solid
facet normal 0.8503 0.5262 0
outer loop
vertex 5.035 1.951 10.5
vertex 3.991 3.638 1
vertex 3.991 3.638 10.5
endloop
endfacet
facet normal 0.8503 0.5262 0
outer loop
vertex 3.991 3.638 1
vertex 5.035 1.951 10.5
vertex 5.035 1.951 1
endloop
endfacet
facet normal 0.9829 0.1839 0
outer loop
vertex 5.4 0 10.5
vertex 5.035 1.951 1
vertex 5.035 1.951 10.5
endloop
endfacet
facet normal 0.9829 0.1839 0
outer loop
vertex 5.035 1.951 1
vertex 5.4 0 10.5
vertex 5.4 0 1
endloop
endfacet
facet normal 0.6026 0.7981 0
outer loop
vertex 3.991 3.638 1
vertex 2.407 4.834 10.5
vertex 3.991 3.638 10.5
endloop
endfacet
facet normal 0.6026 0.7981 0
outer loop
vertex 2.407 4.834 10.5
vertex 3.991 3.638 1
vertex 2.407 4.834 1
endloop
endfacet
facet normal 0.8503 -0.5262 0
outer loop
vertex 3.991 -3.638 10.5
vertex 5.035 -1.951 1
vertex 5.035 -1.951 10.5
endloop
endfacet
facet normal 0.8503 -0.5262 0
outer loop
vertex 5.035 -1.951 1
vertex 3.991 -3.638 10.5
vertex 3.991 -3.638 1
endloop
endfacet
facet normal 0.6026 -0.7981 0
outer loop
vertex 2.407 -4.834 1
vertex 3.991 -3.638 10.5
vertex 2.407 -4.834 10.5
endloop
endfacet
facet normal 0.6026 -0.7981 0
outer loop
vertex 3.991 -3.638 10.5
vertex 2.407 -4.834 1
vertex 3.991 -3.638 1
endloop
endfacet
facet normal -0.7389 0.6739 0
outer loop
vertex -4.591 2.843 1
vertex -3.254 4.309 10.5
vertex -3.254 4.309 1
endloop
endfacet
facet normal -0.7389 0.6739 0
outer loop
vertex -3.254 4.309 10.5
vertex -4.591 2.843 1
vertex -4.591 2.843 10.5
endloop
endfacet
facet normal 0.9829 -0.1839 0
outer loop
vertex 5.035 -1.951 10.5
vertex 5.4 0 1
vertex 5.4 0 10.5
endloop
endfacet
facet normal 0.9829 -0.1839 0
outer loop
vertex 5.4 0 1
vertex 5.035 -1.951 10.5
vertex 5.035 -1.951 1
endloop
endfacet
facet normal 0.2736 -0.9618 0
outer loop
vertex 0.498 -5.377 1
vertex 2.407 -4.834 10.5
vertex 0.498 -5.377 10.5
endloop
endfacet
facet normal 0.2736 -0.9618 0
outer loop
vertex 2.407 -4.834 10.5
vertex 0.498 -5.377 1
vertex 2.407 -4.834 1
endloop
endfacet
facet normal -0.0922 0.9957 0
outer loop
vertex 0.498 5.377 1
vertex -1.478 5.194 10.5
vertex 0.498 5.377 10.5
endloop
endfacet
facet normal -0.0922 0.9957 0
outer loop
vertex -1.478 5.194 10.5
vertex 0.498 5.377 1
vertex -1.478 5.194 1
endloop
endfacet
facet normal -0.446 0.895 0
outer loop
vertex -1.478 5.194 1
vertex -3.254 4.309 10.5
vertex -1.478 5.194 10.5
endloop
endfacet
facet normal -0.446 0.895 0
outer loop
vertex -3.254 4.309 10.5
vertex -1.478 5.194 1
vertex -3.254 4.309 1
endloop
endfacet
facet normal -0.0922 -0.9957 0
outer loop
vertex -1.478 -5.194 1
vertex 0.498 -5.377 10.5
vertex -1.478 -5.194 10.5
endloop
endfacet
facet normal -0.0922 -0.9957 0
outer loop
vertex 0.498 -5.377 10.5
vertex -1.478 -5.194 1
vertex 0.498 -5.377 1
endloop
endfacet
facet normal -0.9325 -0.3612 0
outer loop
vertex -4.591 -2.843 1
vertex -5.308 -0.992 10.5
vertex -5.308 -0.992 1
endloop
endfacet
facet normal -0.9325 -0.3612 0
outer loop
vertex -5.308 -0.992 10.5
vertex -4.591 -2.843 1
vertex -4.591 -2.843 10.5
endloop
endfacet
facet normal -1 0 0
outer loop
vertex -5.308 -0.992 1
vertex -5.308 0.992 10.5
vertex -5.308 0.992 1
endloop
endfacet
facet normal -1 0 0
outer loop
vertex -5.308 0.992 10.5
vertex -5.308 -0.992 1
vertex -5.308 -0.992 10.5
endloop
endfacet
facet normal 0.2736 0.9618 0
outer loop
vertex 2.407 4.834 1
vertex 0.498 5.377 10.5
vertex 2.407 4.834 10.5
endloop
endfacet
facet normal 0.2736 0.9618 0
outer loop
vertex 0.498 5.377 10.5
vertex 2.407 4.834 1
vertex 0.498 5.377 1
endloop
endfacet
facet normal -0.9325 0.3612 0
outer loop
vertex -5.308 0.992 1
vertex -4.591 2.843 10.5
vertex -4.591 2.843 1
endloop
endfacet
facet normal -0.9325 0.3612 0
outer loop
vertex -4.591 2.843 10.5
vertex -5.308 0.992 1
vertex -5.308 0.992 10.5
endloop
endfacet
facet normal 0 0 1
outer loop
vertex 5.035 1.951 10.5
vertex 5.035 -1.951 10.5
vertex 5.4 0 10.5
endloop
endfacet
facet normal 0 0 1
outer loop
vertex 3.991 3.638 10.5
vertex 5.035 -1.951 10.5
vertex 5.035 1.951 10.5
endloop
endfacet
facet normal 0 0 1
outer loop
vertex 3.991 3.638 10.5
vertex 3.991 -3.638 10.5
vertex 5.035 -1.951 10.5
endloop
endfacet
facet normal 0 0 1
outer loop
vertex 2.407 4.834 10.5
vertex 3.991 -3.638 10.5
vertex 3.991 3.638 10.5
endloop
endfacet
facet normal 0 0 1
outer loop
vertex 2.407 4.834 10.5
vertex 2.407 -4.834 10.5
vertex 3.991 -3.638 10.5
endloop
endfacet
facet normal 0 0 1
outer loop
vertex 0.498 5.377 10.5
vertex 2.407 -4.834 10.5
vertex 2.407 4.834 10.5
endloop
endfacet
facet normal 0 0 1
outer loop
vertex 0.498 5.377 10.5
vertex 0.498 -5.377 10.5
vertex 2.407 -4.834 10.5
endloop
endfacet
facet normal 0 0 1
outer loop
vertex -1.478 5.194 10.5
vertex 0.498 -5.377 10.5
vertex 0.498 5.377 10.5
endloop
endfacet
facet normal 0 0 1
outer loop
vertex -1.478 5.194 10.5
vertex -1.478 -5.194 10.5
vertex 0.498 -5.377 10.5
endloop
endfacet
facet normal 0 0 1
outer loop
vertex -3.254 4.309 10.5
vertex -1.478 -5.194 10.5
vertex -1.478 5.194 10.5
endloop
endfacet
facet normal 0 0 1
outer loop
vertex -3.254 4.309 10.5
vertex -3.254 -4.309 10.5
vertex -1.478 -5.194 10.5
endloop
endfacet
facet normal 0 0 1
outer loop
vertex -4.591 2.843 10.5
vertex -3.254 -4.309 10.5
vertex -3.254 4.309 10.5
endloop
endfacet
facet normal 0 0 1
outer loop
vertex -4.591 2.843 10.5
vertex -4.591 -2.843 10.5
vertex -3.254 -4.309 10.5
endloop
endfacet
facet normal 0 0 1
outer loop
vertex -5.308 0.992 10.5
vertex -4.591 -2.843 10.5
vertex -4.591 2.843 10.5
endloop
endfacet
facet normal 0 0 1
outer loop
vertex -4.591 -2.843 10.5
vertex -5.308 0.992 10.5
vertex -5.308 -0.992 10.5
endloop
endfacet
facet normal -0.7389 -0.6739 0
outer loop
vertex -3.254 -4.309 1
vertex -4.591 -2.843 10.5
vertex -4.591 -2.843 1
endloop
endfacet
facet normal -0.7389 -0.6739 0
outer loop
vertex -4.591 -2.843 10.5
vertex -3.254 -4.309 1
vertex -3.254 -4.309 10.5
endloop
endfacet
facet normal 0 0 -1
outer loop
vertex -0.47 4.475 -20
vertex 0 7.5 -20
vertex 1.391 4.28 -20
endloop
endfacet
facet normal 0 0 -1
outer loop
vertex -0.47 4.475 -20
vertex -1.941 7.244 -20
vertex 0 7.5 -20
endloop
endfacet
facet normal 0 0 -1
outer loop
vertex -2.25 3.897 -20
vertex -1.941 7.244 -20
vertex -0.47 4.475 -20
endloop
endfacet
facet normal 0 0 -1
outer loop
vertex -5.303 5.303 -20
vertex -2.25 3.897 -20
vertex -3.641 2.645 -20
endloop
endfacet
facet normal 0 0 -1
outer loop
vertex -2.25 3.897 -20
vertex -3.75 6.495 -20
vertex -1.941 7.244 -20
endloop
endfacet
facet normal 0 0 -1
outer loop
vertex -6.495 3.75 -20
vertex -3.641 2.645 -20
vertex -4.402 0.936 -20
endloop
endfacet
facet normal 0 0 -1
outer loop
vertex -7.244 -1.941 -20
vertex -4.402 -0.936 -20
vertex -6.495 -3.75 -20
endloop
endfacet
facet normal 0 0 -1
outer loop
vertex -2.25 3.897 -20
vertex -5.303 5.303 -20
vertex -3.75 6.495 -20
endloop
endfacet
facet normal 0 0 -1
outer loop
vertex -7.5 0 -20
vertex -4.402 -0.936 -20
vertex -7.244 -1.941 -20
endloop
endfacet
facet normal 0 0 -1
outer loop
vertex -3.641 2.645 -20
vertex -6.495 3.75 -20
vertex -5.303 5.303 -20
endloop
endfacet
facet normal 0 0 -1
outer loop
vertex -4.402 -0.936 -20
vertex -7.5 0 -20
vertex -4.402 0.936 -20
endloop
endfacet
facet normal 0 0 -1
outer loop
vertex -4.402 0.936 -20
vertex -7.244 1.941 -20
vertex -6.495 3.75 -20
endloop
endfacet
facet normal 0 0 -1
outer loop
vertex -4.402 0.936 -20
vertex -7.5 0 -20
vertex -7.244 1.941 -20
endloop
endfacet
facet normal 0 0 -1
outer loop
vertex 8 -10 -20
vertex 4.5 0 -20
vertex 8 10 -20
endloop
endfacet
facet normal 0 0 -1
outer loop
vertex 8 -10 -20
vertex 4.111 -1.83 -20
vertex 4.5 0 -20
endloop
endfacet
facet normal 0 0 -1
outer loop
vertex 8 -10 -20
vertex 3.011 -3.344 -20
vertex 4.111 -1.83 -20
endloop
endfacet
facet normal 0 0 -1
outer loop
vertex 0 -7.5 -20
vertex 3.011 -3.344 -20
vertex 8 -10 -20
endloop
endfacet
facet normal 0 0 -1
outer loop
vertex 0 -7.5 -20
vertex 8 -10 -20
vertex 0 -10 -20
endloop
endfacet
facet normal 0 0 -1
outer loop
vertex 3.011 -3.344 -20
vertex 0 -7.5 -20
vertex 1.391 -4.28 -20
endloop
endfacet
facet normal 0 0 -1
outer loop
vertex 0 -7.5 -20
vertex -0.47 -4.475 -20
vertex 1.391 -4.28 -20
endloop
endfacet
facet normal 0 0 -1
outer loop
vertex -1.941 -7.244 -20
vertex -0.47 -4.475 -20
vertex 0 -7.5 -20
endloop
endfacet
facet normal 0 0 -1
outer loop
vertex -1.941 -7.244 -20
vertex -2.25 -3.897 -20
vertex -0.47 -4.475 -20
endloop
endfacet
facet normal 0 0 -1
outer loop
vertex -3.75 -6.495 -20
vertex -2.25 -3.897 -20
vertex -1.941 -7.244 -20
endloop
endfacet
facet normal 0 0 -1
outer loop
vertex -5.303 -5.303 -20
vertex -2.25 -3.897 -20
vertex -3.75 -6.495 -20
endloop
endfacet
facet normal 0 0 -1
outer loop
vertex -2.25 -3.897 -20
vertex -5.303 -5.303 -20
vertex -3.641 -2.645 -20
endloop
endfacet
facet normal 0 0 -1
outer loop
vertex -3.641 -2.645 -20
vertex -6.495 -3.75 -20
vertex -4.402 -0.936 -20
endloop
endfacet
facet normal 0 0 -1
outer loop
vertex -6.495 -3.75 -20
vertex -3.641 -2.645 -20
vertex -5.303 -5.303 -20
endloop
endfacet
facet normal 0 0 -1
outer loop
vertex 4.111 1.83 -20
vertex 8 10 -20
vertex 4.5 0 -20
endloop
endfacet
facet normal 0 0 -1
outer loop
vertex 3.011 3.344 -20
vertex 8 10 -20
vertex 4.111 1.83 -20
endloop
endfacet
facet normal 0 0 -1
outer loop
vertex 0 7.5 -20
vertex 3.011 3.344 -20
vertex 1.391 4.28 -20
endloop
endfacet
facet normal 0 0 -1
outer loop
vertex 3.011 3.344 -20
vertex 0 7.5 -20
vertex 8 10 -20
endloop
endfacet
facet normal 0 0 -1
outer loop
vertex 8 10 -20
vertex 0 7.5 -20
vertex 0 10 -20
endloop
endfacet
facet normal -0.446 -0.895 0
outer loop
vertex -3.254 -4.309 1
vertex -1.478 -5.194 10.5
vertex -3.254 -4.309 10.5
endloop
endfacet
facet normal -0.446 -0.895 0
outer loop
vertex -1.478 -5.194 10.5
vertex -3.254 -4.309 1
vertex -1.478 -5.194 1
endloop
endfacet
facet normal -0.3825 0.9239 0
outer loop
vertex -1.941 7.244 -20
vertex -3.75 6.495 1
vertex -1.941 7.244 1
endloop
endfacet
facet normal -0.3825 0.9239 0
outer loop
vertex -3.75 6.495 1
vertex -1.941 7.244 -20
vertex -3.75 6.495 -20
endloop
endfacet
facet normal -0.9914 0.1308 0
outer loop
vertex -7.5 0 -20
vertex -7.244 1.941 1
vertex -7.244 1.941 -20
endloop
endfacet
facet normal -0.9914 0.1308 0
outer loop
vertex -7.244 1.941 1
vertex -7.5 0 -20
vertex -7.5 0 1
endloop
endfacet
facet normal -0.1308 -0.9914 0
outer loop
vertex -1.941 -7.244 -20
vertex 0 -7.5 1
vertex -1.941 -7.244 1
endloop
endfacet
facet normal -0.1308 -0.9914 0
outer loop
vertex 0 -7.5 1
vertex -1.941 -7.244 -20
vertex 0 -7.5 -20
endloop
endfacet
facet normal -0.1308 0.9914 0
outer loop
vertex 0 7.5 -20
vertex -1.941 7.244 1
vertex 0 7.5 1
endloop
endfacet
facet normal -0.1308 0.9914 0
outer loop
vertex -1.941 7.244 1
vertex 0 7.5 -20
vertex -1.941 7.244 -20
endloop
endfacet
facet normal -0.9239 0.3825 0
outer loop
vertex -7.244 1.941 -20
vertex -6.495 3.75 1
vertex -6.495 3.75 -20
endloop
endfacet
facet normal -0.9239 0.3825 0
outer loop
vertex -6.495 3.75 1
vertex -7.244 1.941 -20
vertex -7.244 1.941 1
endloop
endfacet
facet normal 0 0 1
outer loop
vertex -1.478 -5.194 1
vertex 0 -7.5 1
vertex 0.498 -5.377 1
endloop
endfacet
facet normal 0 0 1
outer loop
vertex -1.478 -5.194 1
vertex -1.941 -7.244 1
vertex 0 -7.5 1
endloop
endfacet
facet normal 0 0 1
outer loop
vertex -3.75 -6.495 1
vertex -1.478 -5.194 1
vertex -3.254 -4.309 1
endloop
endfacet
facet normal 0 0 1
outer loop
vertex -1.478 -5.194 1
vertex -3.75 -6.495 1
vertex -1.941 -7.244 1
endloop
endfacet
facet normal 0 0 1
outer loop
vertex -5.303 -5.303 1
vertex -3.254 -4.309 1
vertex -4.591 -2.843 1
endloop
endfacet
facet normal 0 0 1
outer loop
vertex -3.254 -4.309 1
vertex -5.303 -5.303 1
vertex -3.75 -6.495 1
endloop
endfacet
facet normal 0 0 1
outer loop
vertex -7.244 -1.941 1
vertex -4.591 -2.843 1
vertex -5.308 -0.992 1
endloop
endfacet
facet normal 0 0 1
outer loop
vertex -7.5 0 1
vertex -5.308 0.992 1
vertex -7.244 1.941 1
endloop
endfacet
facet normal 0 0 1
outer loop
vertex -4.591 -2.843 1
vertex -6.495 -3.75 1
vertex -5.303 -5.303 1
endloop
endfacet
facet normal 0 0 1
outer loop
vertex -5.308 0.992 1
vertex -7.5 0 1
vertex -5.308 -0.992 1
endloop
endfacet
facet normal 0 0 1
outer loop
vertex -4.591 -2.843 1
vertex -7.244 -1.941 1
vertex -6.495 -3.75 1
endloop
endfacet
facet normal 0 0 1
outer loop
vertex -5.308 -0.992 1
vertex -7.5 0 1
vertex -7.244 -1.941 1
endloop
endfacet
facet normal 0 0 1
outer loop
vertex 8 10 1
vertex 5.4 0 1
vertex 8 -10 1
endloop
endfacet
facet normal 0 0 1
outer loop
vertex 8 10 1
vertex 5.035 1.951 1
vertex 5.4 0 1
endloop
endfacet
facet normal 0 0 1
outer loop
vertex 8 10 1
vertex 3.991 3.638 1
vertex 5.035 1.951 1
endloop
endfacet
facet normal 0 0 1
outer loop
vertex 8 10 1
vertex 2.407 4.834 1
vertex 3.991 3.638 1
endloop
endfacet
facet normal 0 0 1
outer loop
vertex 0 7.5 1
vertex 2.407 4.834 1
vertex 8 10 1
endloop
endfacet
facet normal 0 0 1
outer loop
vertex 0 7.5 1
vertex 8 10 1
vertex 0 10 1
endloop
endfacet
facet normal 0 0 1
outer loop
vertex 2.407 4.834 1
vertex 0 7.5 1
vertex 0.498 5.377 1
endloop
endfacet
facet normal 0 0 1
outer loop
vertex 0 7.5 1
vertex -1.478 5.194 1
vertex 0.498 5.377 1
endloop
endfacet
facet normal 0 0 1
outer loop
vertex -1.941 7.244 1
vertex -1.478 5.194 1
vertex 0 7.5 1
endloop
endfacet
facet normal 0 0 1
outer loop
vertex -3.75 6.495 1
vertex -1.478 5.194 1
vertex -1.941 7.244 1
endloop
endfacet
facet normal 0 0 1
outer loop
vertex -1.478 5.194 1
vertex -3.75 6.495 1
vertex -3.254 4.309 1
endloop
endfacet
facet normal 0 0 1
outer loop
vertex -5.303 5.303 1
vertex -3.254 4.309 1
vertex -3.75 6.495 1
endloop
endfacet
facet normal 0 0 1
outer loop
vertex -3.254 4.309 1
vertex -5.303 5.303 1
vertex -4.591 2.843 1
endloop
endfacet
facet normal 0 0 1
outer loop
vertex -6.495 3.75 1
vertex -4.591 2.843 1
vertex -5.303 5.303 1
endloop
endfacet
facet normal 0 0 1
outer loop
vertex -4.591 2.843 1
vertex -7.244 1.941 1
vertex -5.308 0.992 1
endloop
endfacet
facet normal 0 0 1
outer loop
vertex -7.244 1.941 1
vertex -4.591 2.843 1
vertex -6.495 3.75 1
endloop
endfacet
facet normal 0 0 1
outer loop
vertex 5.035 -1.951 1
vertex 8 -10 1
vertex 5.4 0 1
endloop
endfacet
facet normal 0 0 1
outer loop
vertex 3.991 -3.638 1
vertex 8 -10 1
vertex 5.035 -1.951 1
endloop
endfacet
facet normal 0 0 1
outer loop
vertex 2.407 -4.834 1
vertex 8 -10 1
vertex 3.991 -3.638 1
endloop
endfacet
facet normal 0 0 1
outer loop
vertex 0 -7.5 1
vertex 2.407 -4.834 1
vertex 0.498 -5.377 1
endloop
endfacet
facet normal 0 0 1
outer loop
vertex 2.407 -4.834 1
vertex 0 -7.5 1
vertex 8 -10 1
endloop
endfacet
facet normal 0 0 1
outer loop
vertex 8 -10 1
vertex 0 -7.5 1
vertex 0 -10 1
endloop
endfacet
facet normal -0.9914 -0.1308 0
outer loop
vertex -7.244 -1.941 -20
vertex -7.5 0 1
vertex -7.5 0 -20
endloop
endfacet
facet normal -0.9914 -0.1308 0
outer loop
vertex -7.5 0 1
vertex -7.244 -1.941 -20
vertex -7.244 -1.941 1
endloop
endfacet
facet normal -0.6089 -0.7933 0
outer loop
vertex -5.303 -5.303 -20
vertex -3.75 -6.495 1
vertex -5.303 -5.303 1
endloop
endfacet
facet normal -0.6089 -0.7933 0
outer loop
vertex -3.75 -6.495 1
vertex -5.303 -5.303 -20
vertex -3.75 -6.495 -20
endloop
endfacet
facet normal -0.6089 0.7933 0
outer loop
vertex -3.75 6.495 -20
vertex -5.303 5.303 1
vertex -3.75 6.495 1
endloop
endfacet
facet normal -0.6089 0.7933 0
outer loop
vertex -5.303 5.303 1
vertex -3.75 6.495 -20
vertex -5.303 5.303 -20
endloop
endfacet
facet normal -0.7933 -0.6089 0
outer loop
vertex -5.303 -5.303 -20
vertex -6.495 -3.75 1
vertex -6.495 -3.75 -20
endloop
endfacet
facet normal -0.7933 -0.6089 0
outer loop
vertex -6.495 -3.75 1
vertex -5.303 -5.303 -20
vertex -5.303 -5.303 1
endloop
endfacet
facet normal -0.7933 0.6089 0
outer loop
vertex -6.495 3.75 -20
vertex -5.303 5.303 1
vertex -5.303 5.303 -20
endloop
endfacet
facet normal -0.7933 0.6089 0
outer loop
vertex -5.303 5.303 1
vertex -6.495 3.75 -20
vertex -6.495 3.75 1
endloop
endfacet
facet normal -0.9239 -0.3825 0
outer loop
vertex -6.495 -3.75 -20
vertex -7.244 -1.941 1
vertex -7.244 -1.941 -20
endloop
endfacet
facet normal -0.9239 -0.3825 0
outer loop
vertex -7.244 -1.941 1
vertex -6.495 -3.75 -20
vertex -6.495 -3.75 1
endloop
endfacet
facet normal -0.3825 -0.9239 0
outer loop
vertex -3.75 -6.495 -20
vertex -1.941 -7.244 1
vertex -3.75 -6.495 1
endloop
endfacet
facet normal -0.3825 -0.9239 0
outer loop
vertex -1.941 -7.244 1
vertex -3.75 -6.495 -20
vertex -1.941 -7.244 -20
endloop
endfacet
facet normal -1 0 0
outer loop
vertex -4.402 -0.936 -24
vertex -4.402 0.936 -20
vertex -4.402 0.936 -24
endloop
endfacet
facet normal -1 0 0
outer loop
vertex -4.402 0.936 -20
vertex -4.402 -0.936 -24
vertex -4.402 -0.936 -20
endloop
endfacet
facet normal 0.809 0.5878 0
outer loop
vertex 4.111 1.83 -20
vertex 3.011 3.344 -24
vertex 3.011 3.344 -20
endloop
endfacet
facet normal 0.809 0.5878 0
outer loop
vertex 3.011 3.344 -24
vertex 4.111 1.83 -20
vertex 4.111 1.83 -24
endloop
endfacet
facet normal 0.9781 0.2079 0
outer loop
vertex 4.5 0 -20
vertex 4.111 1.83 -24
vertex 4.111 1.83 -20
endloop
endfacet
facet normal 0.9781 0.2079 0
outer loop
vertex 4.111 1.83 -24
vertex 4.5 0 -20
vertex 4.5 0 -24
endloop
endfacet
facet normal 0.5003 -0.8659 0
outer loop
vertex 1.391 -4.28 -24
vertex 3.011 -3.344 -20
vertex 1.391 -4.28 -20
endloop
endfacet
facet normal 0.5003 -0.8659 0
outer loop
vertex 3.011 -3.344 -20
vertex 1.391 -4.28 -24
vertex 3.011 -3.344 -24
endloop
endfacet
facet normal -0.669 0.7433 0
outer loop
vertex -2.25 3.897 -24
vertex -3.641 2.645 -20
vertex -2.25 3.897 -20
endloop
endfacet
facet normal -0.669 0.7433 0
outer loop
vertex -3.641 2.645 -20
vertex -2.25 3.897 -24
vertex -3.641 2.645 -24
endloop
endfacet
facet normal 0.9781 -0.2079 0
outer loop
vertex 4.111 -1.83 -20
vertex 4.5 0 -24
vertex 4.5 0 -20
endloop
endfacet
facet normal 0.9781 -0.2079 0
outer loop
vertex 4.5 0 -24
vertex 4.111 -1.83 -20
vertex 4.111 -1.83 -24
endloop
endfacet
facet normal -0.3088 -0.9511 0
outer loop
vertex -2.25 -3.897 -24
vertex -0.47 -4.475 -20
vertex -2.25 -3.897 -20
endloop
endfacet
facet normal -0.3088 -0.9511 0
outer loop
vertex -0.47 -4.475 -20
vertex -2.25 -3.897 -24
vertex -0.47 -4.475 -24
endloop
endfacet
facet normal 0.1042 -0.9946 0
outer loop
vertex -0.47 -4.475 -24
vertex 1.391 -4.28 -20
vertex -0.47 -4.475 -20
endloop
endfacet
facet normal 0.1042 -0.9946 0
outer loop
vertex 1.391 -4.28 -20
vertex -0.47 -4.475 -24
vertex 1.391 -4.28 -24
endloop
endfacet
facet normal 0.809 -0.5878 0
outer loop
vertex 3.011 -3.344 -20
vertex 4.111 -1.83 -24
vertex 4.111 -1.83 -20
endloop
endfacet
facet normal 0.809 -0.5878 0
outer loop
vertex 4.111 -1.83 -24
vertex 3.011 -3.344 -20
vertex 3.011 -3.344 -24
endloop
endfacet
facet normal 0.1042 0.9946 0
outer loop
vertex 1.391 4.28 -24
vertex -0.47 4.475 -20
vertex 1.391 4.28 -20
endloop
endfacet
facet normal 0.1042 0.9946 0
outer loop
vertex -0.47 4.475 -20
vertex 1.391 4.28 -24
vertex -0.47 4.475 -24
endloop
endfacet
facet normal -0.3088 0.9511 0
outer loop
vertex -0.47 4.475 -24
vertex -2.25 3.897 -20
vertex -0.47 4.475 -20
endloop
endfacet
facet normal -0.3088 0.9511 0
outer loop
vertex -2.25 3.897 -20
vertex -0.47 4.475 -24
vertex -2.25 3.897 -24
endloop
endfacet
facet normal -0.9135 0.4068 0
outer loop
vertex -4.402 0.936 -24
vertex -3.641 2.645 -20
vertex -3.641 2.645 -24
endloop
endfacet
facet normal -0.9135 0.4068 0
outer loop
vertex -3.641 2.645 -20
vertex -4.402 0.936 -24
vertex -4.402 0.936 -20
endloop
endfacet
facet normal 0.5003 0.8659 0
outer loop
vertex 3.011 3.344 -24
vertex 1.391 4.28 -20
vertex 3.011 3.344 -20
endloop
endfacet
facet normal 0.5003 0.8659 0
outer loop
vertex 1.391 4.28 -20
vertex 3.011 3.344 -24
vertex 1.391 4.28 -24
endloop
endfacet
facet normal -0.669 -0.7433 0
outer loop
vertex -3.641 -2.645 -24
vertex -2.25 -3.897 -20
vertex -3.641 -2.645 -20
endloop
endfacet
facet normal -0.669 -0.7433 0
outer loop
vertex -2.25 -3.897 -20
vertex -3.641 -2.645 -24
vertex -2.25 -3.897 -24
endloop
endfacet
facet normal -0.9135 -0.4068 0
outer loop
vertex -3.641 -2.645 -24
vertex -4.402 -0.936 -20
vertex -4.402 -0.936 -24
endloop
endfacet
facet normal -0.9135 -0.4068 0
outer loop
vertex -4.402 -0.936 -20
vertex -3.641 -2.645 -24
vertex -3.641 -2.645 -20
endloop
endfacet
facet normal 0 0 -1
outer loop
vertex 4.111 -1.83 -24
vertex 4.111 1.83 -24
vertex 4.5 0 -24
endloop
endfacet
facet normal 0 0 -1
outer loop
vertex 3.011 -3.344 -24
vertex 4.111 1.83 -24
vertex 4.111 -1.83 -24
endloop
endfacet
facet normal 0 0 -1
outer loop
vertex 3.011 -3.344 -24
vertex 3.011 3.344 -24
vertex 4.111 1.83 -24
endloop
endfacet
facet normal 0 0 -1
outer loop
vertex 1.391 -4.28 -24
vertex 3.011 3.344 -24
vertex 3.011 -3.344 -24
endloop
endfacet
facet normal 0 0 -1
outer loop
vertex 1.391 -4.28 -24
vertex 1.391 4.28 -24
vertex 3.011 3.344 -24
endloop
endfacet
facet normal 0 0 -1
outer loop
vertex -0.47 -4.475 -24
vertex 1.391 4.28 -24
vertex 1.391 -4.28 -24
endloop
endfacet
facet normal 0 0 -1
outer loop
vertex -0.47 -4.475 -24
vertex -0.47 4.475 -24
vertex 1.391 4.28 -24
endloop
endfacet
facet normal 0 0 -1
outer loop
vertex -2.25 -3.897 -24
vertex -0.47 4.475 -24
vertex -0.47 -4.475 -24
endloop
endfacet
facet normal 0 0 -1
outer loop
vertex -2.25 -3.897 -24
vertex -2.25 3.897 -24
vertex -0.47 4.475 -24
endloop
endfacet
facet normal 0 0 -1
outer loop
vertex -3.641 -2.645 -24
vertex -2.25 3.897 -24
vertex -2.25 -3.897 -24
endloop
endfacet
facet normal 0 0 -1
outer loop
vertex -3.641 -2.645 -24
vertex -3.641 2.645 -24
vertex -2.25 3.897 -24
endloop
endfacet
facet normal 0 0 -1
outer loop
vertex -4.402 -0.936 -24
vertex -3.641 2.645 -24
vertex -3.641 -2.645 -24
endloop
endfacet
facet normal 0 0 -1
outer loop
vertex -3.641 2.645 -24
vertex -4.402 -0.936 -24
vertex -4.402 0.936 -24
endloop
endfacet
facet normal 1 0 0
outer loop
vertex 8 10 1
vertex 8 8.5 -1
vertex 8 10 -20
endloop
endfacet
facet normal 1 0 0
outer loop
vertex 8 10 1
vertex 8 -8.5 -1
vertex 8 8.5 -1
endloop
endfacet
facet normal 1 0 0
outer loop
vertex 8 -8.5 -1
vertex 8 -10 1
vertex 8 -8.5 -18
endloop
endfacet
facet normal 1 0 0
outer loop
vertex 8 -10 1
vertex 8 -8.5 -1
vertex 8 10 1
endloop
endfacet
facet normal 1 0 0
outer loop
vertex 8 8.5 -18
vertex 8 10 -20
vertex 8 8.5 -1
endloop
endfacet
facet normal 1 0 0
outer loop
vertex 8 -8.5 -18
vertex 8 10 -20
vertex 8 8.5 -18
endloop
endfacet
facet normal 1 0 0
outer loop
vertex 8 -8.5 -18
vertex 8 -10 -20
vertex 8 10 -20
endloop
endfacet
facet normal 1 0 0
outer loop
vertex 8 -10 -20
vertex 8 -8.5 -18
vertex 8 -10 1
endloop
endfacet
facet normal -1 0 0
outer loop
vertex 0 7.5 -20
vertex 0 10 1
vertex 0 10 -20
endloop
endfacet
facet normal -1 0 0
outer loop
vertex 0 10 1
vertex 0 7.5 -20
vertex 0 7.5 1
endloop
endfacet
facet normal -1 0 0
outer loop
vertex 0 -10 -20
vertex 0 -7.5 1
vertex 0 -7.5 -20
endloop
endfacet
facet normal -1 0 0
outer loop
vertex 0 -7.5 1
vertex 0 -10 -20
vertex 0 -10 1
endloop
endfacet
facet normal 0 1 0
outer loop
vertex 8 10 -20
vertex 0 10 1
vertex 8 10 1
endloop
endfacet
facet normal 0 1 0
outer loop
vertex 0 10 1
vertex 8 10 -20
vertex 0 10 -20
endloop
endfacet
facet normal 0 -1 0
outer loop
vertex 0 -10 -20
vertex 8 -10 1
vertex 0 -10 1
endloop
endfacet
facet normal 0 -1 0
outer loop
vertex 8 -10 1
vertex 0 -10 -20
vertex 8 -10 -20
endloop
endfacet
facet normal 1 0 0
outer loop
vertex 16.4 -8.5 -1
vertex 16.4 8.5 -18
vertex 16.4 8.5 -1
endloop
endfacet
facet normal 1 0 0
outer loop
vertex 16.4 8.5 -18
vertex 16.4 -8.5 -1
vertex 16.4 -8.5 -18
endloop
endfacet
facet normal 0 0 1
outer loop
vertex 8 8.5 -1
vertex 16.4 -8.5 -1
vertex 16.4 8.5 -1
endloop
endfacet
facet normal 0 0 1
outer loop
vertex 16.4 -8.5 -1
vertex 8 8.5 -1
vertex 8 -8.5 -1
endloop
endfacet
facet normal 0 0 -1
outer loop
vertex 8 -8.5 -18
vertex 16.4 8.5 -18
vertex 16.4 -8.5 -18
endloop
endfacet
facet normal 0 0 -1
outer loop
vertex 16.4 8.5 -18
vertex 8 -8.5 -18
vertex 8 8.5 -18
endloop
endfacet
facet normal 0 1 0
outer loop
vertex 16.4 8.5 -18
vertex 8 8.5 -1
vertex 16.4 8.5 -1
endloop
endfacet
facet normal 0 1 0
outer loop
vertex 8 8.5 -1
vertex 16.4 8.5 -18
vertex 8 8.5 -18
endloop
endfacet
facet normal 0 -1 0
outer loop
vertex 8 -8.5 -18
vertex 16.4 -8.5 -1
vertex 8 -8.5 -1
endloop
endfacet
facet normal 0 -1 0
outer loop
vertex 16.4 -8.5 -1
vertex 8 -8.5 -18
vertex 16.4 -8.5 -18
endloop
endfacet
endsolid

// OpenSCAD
module jack_connector()
{
    translate([0,0,-20])
    union()
    {
        cylinder(d=10.8,h=30.5);
        cylinder(d=15,h=21);
        translate([0,0,-4]) cylinder(d=9,h=5);
        translate([0,-10,0]) cube([8,20,21]);
        translate([7.9,-17/2,2]) cube([8.5,17,17,]);
    }
}
jack_connector();
